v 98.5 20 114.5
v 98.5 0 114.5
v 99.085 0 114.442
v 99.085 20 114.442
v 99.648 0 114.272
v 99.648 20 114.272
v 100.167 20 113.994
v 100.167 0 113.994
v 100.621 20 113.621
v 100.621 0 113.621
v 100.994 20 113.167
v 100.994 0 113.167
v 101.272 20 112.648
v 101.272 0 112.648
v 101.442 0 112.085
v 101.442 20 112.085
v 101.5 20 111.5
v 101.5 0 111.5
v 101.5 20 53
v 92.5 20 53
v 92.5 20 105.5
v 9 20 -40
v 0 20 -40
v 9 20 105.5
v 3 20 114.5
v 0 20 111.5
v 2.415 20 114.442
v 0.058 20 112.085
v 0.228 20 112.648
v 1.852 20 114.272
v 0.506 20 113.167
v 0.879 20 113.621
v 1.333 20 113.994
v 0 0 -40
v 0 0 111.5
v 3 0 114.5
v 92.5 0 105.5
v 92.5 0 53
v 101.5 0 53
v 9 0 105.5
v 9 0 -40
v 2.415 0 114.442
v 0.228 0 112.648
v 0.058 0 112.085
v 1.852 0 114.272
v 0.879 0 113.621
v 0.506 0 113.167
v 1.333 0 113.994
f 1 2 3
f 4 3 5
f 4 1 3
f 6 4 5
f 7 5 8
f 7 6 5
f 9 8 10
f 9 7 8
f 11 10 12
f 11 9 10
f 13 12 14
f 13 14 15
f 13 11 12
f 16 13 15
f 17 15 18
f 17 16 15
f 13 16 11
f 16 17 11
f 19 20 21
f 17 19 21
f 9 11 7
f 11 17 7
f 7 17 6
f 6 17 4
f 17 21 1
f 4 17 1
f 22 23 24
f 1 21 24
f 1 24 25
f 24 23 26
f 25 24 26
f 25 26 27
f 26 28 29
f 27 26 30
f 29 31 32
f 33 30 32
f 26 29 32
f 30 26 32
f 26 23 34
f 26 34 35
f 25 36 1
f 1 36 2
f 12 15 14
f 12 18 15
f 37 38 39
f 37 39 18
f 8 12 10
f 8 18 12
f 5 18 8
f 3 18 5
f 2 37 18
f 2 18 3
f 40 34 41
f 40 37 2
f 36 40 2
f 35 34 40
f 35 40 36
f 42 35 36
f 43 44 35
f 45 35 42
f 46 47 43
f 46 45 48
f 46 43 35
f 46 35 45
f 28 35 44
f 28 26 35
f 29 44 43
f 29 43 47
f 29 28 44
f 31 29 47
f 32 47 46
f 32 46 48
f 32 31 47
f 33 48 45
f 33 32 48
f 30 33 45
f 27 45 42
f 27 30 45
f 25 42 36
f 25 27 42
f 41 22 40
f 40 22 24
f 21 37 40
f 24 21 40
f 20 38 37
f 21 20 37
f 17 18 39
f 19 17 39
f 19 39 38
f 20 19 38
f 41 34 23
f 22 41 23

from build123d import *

# Parameters (mm, degrees)
SKETCH_1_W      = 9
SKETCH_1_H      = 105.5
EXTRUDE_1_DEPTH = 20
FILLET_1_R      = 3
SKETCH_2_W      = 40
SKETCH_2_H      = 20
EXTRUDE_2_DEPTH = 9


with BuildPart() as part:
    # 草图1 → 凸台-拉伸1 (new body)
    with BuildSketch(Plane(origin=(0, 0, 0), x_dir=(1, 0, 0), z_dir=(0, 1, 0))):
        with Locations((4.5, -52.75)):
            Rectangle(SKETCH_1_W, SKETCH_1_H)
        Polygon((9, -105.5), (0, -105.5), (0, -114.5), (92.5, -114.5), (92.5, -105.5), align=None)
        Polygon((92.5, -53), (92.5, -105.5), (92.5, -114.5), (101.5, -114.5), (101.5, -53), align=None)
    extrude(amount=EXTRUDE_1_DEPTH)

    # 圆角1
    fillet_1_edges = [part.edges().sort_by_distance(p)[0] for p in [
        (101.5, 10, 114.5),
        (0, 10, 114.5),
    ]]
    fillet(fillet_1_edges, radius=FILLET_1_R)

    # 草图2 → 凸台-拉伸2 (add)
    with BuildSketch(Plane.ZY):
        with Locations((-20, 10)):
            Rectangle(SKETCH_2_W, SKETCH_2_H)
    extrude(amount=-EXTRUDE_2_DEPTH)


solid = part.part
